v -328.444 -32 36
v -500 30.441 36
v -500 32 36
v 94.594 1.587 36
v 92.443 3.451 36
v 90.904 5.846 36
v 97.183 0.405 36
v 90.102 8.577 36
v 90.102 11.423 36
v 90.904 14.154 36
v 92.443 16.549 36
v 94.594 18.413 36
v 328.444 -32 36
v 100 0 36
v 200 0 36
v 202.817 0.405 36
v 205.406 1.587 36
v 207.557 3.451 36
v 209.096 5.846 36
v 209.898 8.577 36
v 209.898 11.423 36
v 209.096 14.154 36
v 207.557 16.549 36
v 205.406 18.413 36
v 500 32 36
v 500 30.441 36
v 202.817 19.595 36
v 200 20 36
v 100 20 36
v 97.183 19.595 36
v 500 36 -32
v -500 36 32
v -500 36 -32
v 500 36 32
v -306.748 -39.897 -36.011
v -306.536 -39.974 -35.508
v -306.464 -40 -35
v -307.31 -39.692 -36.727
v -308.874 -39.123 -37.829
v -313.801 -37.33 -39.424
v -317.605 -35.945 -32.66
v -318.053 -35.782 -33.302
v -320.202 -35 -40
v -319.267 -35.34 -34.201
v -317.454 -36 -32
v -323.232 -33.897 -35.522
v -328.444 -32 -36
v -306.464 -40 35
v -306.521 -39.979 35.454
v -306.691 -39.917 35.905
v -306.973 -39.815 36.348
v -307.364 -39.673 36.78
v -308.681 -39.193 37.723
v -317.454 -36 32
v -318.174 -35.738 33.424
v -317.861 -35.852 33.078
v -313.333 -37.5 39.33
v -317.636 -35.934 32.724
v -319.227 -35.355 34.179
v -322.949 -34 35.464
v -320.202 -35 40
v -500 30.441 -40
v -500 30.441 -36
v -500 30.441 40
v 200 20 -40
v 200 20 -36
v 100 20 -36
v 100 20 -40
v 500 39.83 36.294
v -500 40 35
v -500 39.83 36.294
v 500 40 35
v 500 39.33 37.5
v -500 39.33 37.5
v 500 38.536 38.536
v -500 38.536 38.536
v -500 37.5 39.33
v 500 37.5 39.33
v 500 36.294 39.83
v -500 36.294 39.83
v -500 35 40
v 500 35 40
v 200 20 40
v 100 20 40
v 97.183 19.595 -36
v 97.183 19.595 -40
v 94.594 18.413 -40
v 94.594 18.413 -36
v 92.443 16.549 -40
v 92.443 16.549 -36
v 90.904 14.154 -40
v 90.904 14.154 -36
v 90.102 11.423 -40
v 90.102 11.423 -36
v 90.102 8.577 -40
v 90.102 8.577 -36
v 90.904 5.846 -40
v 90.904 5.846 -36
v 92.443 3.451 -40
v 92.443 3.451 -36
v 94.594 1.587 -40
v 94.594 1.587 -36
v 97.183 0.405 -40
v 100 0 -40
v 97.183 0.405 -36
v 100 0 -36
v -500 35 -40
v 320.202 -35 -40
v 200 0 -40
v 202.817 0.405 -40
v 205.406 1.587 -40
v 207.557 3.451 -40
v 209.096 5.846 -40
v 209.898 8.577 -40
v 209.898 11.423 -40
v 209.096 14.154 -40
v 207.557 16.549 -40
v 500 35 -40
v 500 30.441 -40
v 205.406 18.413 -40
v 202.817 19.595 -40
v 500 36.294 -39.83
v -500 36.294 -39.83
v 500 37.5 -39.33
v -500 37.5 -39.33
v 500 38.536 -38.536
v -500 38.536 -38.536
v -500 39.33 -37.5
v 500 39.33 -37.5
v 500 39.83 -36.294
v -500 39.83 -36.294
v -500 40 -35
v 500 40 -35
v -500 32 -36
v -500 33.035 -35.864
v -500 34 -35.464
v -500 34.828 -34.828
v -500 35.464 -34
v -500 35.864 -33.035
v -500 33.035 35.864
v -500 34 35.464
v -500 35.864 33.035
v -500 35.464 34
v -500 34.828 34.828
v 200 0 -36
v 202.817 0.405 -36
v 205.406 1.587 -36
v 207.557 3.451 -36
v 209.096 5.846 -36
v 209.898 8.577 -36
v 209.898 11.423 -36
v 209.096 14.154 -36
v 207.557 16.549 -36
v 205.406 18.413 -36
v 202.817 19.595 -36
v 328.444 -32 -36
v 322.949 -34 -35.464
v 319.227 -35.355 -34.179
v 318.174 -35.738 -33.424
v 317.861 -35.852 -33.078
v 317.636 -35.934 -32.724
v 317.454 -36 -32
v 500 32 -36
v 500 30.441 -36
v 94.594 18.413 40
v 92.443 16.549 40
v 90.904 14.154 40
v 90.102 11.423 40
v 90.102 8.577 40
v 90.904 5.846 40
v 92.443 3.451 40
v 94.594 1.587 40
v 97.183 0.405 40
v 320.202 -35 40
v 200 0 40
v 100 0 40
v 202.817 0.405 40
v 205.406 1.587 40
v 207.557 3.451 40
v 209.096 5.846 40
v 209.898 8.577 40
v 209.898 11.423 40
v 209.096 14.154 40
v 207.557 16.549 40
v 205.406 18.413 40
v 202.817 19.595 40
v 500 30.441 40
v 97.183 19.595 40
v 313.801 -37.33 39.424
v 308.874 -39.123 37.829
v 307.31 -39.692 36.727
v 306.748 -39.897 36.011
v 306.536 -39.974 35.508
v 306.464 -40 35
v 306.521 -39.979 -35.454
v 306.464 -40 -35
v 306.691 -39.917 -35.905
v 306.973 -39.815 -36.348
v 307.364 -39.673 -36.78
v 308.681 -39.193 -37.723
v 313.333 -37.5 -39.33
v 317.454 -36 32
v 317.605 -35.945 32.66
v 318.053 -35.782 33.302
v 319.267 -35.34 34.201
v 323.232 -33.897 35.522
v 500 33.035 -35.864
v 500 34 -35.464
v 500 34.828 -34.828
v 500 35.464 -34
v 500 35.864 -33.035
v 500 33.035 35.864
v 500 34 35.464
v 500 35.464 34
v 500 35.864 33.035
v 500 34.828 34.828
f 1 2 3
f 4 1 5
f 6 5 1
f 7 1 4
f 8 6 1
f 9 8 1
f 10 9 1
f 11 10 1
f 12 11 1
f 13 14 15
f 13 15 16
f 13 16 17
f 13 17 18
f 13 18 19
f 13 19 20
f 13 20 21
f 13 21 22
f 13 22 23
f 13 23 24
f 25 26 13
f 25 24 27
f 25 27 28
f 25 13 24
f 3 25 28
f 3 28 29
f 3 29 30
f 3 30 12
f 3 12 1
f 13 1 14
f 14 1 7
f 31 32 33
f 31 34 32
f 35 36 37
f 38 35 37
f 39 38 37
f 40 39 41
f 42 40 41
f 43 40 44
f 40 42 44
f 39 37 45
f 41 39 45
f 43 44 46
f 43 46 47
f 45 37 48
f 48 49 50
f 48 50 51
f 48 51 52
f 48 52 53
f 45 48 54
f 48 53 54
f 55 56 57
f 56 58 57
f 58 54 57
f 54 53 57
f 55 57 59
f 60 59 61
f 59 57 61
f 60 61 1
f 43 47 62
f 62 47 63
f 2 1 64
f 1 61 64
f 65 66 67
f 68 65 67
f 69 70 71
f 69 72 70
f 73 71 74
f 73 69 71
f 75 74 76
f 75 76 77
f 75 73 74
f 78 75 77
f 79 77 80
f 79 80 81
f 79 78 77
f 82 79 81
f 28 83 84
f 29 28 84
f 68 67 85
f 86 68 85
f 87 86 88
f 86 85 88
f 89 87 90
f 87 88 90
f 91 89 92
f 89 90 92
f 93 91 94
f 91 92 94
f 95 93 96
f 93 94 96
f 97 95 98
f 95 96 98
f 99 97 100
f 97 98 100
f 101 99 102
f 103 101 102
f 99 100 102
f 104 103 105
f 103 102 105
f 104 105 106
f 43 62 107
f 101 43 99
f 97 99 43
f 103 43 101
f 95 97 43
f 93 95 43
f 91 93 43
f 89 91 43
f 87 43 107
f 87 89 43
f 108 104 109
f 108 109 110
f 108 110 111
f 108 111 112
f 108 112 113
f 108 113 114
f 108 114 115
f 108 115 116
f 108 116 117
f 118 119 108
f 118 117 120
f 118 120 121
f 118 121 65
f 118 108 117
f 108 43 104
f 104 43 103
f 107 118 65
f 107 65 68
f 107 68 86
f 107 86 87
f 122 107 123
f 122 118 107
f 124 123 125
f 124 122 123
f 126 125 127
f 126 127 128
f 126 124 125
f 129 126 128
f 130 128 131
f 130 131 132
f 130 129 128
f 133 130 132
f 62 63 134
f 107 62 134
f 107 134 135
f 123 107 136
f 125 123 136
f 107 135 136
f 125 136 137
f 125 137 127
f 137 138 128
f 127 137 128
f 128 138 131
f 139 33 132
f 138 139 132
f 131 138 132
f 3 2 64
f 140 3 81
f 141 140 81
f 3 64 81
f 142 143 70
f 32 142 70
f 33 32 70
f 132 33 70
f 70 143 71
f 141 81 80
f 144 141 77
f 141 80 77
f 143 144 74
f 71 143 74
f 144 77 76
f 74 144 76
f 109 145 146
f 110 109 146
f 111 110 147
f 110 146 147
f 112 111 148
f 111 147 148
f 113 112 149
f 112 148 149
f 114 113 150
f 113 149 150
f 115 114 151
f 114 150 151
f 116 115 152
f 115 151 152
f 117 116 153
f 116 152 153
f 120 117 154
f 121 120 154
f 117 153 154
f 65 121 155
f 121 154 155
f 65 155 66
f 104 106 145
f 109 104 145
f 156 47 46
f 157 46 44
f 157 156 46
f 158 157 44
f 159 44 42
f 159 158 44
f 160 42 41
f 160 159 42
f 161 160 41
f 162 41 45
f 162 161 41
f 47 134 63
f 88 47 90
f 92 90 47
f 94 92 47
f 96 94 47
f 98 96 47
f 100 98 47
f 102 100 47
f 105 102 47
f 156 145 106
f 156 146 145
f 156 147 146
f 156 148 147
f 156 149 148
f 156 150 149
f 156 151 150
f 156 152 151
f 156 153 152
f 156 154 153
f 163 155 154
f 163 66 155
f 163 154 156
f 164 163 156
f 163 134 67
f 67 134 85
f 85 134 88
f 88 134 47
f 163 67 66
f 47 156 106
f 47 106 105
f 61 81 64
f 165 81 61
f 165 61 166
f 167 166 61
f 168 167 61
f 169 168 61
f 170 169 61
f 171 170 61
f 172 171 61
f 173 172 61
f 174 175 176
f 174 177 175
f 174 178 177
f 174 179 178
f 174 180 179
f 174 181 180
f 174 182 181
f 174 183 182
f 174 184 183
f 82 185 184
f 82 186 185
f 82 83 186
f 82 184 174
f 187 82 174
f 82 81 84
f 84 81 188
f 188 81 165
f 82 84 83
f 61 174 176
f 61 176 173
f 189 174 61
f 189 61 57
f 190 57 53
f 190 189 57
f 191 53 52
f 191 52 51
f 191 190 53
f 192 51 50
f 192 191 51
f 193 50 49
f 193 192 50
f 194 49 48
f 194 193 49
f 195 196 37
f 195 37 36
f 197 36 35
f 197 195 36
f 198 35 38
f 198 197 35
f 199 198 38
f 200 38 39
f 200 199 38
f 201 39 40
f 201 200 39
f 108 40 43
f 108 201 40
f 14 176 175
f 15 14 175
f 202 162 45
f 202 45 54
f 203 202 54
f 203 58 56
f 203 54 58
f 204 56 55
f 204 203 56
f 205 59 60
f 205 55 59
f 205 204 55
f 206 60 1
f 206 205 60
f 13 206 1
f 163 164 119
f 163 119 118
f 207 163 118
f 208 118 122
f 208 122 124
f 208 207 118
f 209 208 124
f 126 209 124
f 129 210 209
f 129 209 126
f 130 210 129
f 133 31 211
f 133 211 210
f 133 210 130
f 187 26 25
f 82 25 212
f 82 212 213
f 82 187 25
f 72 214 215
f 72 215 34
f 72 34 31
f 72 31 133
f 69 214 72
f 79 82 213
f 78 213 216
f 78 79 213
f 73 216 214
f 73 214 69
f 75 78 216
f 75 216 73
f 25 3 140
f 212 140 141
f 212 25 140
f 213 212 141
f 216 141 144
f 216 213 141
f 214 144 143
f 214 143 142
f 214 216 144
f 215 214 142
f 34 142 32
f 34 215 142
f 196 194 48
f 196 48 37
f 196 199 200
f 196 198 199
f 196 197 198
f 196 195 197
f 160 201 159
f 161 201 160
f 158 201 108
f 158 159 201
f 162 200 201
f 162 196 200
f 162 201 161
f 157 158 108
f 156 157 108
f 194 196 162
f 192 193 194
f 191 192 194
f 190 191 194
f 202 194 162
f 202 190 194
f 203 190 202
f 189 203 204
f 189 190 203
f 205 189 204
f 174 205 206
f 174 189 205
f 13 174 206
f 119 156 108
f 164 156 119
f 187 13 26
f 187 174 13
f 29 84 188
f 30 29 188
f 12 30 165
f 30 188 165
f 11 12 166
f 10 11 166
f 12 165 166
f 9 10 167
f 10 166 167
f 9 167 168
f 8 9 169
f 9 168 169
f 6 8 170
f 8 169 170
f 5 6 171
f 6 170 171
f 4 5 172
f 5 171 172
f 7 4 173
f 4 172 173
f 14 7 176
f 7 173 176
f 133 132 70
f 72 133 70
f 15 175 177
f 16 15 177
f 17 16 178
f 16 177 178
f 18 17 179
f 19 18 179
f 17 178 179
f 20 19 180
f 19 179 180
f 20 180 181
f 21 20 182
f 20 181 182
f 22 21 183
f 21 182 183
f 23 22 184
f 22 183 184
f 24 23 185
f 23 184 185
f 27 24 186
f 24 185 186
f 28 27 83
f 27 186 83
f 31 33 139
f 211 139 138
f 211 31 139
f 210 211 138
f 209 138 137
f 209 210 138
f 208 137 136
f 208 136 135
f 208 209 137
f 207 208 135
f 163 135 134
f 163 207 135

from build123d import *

# Parameters (mm, degrees)
F1_DEPTH = 500
F3_DEPTH = 80
F5_DEPTH = 80.001


# Not quite as in the source:
# - a pattern or mirror of a feature is missing from the dataset's text; its kind, count and spacing are read off the source's solid


with BuildPart() as f1:
    # F0 (on Right) → F1 (new body, symmetric)
    with BuildSketch(Plane.YZ):
        with BuildLine():
            Line((35, 40), (-35, 40))
            ThreePointArc((-35, 40), (-38.5355339059, 38.5355339059), (-40, 35))
            Line((-40, 35), (-40, -35))
            ThreePointArc((-40, -35), (-38.5355339059, -38.5355339059), (-35, -40))
            Line((-35, -40), (35, -40))
            ThreePointArc((35, -40), (38.5355339059, -38.5355339059), (40, -35))
            Line((40, -35), (40, 35))
            ThreePointArc((40, 35), (38.5355339059, 38.5355339059), (35, 40))
        make_face()
        with BuildLine():
            ThreePointArc((-36, 32), (-34.8284271247, 34.8284271247), (-32, 36))
            Line((-32, 36), (32, 36))
            ThreePointArc((32, 36), (34.8284271247, 34.8284271247), (36, 32))
            Line((36, 32), (36, -32))
            ThreePointArc((36, -32), (34.8284271247, -34.8284271247), (32, -36))
            Line((32, -36), (-32, -36))
            ThreePointArc((-32, -36), (-34.8284271247, -34.8284271247), (-36, -32))
            Line((-36, -32), (-36, 32))
        make_face(mode=Mode.SUBTRACT)
    extrude(amount=F1_DEPTH, both=True)

    # F2 (on face) → F3 (cut, through all)
    with BuildSketch(Plane.XY.offset(40)):
        Polygon((-500, 30.4411906294), (-540, 45), (-540, -54.9271104923), (-265.4525203311, -54.9271104923), (-320.2018064436, -35), (-500, -35), align=None)
        Polygon((-320.2018064436, -35), (-500, 30.4411906294), (-500, -35), align=None)
    f3 = extrude(amount=-F3_DEPTH, mode=Mode.SUBTRACT)

    # F3_copies: F3 across plane
    add(f3.mirror(Plane(origin=(0, 0, 0), x_dir=(0, 0, 1), z_dir=(1, 0, 0))), mode=Mode.SUBTRACT)

    # F4 (on face) → F5 (cut, through all)
    with BuildSketch(Plane.XY.offset(40)):
        with BuildLine():
            Line((100, 0), (200, 0))
            ThreePointArc((200, 0), (210, 10), (200, 20))
            Line((200, 20), (100, 20))
            ThreePointArc((100, 20), (90, 10), (100, 0))
        make_face()
    extrude(amount=-F5_DEPTH, mode=Mode.SUBTRACT)


solid = f1.part
